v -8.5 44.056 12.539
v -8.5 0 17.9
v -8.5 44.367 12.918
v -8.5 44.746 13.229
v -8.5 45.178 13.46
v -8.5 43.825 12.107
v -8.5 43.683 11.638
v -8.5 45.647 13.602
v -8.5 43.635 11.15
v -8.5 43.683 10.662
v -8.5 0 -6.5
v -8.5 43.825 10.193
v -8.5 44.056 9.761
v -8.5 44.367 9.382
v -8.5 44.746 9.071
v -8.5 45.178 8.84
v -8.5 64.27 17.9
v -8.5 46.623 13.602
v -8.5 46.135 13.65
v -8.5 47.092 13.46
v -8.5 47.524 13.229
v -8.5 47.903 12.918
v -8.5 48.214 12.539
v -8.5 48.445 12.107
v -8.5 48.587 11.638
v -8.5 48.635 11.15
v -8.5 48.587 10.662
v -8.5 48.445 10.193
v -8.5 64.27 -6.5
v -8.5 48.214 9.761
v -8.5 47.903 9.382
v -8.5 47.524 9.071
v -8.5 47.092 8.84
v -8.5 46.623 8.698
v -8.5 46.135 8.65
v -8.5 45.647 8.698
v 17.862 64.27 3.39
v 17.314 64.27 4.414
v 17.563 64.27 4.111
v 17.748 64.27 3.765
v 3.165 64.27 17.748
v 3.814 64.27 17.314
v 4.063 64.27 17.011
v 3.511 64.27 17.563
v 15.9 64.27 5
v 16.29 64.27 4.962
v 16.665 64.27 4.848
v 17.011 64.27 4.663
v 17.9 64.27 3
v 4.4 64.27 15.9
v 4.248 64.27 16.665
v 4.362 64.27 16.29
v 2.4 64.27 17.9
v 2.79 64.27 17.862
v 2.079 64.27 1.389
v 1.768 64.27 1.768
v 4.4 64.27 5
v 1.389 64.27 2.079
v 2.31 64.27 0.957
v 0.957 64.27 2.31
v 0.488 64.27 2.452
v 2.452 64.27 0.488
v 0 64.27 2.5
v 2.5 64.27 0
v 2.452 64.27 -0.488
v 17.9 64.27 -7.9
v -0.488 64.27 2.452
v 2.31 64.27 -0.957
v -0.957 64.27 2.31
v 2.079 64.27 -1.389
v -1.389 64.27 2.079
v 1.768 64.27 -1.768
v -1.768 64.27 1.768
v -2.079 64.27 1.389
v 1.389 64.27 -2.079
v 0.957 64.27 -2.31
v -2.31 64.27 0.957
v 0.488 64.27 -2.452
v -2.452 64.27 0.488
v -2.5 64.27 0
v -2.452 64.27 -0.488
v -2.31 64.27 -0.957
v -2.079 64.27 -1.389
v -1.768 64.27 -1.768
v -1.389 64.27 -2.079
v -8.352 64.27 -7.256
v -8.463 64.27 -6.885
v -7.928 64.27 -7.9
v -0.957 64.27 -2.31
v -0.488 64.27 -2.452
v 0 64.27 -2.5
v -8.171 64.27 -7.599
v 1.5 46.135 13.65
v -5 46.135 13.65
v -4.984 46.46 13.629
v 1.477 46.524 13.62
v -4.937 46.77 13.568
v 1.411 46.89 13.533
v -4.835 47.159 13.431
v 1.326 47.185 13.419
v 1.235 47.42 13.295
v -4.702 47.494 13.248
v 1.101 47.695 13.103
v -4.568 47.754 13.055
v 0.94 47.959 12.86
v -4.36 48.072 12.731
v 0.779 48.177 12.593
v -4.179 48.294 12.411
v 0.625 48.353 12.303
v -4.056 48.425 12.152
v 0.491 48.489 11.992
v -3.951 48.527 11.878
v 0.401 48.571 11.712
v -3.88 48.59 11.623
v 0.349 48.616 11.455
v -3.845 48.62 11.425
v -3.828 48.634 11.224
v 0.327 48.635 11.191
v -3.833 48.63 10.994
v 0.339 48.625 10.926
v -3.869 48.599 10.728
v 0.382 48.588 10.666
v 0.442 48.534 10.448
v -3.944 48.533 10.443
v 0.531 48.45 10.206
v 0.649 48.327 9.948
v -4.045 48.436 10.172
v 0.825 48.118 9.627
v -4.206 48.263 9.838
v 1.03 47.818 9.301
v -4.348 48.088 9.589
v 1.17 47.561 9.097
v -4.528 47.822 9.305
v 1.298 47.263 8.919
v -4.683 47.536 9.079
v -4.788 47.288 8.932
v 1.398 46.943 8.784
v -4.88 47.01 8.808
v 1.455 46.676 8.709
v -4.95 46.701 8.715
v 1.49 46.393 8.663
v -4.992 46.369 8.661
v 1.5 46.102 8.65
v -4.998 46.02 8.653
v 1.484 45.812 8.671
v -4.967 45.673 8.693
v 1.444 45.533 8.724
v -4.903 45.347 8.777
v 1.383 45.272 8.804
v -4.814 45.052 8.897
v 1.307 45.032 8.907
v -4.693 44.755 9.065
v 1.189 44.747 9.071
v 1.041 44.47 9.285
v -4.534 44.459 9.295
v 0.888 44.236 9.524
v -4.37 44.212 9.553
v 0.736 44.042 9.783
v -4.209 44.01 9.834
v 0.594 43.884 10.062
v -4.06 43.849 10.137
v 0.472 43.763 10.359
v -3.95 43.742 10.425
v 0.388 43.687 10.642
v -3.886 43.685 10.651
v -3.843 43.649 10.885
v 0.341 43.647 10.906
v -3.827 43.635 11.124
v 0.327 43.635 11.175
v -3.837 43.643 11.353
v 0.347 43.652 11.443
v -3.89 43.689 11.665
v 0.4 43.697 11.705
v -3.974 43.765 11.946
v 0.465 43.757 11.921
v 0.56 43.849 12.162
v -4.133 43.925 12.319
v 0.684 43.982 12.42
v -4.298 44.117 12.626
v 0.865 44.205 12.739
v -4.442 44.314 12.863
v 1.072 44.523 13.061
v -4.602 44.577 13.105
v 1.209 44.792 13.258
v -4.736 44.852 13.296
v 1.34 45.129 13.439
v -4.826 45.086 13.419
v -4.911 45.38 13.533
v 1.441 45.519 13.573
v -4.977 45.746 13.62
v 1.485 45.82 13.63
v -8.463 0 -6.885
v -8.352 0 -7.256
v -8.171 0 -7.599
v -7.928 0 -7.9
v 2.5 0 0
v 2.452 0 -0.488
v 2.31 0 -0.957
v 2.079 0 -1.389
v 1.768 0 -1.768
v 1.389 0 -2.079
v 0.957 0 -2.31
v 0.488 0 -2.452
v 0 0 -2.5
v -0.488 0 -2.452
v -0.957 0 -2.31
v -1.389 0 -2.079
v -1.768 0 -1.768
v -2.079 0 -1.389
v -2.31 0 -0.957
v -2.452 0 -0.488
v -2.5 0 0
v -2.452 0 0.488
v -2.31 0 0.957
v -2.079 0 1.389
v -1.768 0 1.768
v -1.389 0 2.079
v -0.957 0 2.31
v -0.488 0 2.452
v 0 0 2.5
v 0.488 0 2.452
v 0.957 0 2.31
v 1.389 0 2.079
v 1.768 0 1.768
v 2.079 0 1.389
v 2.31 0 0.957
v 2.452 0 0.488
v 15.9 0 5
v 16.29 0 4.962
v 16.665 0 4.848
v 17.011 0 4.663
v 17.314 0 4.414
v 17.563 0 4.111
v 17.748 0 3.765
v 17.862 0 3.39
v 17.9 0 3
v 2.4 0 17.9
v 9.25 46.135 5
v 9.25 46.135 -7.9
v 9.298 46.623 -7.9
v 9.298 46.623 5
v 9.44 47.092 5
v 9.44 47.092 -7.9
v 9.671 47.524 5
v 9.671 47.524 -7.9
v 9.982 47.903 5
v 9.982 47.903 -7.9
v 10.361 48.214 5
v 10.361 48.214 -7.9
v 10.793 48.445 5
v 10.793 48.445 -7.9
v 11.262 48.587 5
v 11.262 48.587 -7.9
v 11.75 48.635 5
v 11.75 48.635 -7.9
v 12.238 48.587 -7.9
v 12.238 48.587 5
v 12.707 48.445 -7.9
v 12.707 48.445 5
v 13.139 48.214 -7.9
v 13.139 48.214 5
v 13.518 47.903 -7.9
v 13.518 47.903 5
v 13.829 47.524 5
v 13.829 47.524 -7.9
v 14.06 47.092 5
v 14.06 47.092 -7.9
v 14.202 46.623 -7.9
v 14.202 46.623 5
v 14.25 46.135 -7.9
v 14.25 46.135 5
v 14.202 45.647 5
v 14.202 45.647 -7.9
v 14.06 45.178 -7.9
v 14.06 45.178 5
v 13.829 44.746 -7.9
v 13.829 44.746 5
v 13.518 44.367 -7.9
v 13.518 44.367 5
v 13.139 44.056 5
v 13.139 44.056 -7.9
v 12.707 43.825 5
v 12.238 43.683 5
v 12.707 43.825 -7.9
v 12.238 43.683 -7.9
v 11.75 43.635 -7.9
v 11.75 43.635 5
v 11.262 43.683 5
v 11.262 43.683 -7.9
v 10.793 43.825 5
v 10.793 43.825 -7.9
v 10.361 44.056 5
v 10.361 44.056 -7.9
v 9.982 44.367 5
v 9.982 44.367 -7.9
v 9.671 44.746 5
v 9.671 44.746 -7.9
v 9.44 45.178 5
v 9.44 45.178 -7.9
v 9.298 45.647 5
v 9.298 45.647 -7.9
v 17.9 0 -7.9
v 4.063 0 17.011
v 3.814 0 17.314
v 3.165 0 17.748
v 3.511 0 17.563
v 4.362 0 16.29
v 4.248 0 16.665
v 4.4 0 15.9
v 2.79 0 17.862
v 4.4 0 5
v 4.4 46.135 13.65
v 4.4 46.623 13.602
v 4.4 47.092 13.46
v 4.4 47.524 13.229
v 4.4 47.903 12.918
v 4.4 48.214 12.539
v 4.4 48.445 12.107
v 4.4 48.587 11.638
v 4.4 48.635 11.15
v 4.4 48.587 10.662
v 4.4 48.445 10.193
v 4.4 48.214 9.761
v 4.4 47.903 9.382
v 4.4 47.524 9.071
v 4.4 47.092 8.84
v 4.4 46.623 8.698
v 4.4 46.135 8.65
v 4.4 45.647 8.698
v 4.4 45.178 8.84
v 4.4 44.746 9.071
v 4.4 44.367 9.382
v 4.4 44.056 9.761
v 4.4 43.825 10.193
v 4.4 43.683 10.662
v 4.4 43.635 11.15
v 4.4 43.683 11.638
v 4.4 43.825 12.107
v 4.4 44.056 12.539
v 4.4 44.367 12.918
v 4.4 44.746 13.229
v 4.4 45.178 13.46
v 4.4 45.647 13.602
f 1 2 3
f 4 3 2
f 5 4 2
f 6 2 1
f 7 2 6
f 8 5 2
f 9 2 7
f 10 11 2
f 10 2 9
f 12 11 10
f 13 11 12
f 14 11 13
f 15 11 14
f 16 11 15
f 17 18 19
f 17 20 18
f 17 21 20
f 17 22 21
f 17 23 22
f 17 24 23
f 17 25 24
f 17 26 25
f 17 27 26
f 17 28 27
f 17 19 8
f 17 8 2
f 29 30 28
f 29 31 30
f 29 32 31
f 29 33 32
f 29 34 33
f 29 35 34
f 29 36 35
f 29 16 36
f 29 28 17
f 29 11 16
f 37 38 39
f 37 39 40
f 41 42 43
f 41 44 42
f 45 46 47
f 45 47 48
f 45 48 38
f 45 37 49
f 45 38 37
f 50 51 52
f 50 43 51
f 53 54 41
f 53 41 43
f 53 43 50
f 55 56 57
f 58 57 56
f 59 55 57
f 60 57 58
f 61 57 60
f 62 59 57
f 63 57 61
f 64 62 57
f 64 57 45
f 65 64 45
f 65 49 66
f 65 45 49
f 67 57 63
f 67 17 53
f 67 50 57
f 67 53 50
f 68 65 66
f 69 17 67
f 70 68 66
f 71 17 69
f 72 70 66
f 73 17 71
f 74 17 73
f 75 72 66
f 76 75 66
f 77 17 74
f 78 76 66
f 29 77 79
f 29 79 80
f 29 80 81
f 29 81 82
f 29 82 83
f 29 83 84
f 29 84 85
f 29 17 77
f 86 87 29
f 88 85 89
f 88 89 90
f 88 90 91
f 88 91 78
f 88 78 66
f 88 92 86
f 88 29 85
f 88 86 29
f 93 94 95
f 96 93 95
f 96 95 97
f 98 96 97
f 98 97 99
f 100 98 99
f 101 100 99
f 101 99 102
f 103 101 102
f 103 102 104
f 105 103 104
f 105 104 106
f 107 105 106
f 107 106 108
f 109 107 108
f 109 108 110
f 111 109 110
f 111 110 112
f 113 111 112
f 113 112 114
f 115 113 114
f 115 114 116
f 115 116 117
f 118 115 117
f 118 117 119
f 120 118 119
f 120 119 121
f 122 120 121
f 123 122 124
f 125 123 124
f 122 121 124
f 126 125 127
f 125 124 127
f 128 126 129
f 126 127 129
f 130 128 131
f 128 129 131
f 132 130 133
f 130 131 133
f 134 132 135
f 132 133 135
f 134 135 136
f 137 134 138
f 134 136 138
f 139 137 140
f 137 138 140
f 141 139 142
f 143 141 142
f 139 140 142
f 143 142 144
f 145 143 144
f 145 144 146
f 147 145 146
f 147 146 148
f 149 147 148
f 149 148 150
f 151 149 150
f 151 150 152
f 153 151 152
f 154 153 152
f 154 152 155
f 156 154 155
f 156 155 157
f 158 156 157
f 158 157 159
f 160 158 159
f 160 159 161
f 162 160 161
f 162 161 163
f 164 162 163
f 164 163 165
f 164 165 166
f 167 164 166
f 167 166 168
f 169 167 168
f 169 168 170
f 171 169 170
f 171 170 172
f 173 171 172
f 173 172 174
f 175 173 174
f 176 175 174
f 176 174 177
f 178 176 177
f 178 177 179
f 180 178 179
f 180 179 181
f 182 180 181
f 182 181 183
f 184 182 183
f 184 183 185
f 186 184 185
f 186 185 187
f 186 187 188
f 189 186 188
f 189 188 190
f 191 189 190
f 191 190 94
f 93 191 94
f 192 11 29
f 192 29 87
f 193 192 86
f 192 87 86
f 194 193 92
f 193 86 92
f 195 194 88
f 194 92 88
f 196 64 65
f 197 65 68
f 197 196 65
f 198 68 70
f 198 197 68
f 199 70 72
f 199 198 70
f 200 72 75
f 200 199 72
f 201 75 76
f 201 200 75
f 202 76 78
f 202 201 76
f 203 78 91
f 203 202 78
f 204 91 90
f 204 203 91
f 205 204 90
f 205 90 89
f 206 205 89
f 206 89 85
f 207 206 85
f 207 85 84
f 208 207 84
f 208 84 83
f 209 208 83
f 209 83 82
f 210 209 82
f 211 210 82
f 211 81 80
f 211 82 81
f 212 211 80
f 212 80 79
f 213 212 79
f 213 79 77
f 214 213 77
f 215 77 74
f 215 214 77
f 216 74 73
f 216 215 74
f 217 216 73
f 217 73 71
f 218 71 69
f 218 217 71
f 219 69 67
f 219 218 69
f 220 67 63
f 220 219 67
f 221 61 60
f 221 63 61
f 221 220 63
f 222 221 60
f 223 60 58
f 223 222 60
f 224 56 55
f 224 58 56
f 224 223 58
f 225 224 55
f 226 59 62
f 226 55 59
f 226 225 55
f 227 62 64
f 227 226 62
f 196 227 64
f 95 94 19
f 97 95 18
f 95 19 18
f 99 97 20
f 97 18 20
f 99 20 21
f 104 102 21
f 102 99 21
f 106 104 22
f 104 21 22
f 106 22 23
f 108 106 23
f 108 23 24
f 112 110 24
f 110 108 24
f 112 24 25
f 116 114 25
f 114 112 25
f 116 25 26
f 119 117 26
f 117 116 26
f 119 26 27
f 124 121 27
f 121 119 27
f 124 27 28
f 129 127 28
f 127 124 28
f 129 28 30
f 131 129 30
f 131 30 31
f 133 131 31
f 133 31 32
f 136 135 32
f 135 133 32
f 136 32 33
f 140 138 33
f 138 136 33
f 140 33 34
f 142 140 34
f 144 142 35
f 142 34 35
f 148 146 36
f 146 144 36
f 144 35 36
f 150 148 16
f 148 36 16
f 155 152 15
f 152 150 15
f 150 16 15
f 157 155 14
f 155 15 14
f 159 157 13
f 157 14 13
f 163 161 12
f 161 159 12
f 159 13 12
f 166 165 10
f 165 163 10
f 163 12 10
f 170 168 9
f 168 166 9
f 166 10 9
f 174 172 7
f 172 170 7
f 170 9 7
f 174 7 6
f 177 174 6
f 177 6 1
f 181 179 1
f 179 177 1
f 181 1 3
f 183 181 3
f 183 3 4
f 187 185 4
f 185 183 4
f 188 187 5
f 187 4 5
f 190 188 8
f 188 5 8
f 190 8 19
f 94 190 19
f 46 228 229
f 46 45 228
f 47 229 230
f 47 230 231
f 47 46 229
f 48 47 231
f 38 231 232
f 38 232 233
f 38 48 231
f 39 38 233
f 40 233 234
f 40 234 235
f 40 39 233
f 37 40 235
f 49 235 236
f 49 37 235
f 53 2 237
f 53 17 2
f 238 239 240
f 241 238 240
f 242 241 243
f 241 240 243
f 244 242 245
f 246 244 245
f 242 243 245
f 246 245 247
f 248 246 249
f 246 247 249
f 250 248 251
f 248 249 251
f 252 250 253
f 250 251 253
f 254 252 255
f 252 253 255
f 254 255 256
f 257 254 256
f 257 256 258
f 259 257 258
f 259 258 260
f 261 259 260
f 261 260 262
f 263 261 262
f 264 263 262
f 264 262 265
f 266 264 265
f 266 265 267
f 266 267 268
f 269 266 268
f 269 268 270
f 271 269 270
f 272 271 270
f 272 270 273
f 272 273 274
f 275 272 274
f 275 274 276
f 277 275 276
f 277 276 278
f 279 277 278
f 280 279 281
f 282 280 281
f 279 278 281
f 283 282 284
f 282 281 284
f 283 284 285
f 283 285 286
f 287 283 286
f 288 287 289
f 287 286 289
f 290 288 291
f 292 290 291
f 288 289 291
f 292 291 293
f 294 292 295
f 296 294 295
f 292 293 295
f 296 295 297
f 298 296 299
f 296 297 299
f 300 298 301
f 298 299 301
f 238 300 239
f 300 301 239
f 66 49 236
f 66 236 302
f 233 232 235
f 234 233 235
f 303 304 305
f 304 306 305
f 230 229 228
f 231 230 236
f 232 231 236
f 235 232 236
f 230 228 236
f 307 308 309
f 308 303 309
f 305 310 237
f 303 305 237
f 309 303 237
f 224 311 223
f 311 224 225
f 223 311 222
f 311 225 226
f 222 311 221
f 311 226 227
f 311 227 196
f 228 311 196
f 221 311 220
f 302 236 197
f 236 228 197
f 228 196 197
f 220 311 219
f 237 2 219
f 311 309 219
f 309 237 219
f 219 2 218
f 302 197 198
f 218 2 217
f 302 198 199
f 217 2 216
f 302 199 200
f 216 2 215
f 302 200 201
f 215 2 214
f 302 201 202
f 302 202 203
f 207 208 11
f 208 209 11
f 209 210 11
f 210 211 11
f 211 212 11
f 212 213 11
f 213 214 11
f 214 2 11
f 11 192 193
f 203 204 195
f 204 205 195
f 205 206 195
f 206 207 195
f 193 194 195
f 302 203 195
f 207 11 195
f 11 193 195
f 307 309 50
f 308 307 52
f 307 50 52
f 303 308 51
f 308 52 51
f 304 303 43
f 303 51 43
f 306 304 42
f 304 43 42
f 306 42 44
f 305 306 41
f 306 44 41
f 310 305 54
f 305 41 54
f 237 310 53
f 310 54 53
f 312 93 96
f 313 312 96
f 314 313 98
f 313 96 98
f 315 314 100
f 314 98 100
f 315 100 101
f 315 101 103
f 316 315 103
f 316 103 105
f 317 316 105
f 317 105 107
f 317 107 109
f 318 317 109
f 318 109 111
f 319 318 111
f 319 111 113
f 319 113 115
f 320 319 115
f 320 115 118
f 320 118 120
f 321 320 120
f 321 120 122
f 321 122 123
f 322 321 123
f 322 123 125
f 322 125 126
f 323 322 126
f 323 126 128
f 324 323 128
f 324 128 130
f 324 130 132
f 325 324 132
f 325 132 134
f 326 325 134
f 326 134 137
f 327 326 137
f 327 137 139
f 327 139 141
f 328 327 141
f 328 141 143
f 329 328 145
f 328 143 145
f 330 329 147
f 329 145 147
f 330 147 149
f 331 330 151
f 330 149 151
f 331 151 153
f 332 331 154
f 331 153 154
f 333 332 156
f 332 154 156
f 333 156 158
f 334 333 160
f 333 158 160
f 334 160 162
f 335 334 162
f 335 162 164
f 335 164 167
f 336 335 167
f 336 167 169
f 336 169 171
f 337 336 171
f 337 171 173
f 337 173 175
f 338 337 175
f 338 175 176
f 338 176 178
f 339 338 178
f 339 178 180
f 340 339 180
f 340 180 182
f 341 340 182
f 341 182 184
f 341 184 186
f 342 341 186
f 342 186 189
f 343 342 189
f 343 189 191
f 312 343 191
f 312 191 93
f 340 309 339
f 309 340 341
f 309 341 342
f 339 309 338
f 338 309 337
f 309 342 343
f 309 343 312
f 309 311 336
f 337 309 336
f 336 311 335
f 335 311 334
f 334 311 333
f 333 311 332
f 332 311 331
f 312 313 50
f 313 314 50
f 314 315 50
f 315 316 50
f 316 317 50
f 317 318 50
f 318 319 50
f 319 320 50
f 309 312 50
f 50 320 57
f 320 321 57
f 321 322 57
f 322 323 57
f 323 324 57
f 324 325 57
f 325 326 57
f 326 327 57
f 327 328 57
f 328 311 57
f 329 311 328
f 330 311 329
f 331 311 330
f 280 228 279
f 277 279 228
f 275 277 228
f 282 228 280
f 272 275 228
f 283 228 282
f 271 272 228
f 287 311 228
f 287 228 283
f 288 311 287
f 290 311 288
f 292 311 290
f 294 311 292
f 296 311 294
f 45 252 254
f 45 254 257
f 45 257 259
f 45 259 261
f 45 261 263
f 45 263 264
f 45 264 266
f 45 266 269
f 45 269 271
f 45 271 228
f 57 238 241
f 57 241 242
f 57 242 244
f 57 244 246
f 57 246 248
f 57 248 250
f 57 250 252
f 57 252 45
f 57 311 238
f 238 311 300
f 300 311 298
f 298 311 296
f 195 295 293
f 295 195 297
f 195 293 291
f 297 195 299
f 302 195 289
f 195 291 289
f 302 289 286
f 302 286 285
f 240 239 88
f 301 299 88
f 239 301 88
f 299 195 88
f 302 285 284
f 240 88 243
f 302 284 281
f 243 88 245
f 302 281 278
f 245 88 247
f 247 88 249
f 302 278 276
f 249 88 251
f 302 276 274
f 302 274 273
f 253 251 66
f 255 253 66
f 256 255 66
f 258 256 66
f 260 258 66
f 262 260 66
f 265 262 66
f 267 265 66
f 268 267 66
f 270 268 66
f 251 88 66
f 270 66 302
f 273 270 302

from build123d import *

# Parameters (mm, degrees)
HOLE_TOPMAIN_OUTLINE_W = 12.9
HOLE_TOPMAIN_OUTLINE_H = 12.9
HOLE_TOPMAIN_OUTLINE_R = 2.5
HOLE_TOPMAIN_DEPTH     = 64.27
SKETCH14_R             = 2.5
CUT_EXTRUDE9_DEPTH     = 67.100627077
SKETCH15_R             = 3.25
CUT_EXTRUDE10_DEPTH    = 66.309210028
SKETCH18_W             = 12.9
SKETCH18_H             = 64.27
SKETCH18_R             = 3.25
BOSS_EXTRUDE2_DEPTH    = 13.5
FILLET3_R              = 2
SKETCH19_R             = 2.5
CUT_EXTRUDE11_DEPTH    = 13.5
SKETCH22_W             = 13.5
SKETCH22_H             = 64.27
BOSS_EXTRUDE3_DEPTH    = 13.5
BOSS_EXTRUDE5_START    = -26.4
SKETCH24_R             = 3.25
BOSS_EXTRUDE5_DEPTH    = 26.4
CUT_EXTRUDE12_START    = -64.27
SKETCH25_R             = 2.5
CUT_EXTRUDE12_DEPTH    = 64.27
SKETCH26_R             = 2.5
CUT_EXTRUDE13_DEPTH    = 13.5
SKETCH28_R             = 2.5
CUT_EXTRUDE14_DEPTH    = 13.5
FILLET4_R              = 2
SKETCH31_W             = 26.4
SKETCH31_H             = 0.6
CUT_EXTRUDE15_DEPTH    = 64.27


# Read off the part's stored shape, not the designer's step: hole-TopMain
with BuildPart() as part:
    # hole-TopMain outline → hole-TopMain (new body)
    with BuildSketch(Plane(origin=(0, 0, 0), x_dir=(1, 0, 0), z_dir=(0, 1, 0))):
        with Locations((-2.05, 2.05)):
            Rectangle(HOLE_TOPMAIN_OUTLINE_W, HOLE_TOPMAIN_OUTLINE_H)
        Circle(HOLE_TOPMAIN_OUTLINE_R, mode=Mode.SUBTRACT)
    extrude(amount=HOLE_TOPMAIN_DEPTH)

    # Sketch14 → Cut-Extrude9 (cut, through all)
    with BuildSketch(Plane(origin=(0, 0, -8.5), x_dir=(-1, 0, 0), z_dir=(0, 0, -1))):
        with Locations((1.75, 46.135)):
            Circle(SKETCH14_R)
    extrude(amount=-CUT_EXTRUDE9_DEPTH, mode=Mode.SUBTRACT)

    # Sketch15 → Cut-Extrude10 (cut, through all)
    with BuildSketch(Plane(origin=(0, 0, -3.5), x_dir=(-1, 0, 0), z_dir=(0, 0, -1))):
        with Locations((1.75, 46.135)):
            Circle(SKETCH15_R)
    extrude(amount=-CUT_EXTRUDE10_DEPTH, mode=Mode.SUBTRACT)

    # Sketch18 → Boss-Extrude2 (add)
    with BuildSketch(Plane.XY.offset(4.4)):
        with Locations((-2.05, 32.135)):
            Rectangle(SKETCH18_W, SKETCH18_H)
        with Locations(Location((-1.75, 46.135, 0), (0, 0, 180))):
            Circle(SKETCH18_R, mode=Mode.SUBTRACT)
    extrude(amount=BOSS_EXTRUDE2_DEPTH)

    # Fillet3
    fillet3_edges = [part.edges().sort_by_distance(p)[0] for p in [
        (-8.5, 32.135, -8.5),
        (4.4, 32.135, 17.9),
    ]]
    fillet(fillet3_edges, radius=FILLET3_R)

    # Sketch19 → Cut-Extrude11 (cut)
    with BuildSketch(Plane.ZY.offset(8.5)):
        with Locations((11.15, 46.135)):
            Circle(SKETCH19_R)
    extrude(amount=-CUT_EXTRUDE11_DEPTH, mode=Mode.SUBTRACT)

    # Sketch22 → Boss-Extrude3 (add)
    with BuildSketch(Plane(origin=(4.4, 0, 0), x_dir=(0, 0, -1), z_dir=(1, 0, 0))):
        with Locations((1.75, 32.135)):
            Rectangle(SKETCH22_W, SKETCH22_H)
    extrude(amount=BOSS_EXTRUDE3_DEPTH)

    # Sketch24 → Boss-Extrude5 (add)
    with BuildSketch(Plane.XY.offset(17.9).offset(BOSS_EXTRUDE5_START)):
        with Locations((-1.75, 46.135)):
            Circle(SKETCH24_R)
    extrude(amount=BOSS_EXTRUDE5_DEPTH)

    # Sketch25 → Cut-Extrude12 (cut)
    with BuildSketch(Plane(origin=(0, 64.27, 0), x_dir=(1, 0, 0), z_dir=(0, 1, 0)).offset(CUT_EXTRUDE12_START)):
        with Locations(Location((0, 0, 0), (0, 0, 90))):
            Circle(SKETCH25_R)
    extrude(amount=CUT_EXTRUDE12_DEPTH, mode=Mode.SUBTRACT)

    # Sketch26 → Cut-Extrude13 (cut)
    with BuildSketch(Plane.ZY.offset(8.5)):
        with Locations((11.15, 46.135)):
            Circle(SKETCH26_R)
    extrude(amount=-CUT_EXTRUDE13_DEPTH, mode=Mode.SUBTRACT)

    # Sketch28 → Cut-Extrude14 (cut)
    with BuildSketch(Plane(origin=(0, 0, -8.5), x_dir=(-1, 0, 0), z_dir=(0, 0, -1))):
        with Locations((-11.75, 46.135)):
            Circle(SKETCH28_R)
    extrude(amount=-CUT_EXTRUDE14_DEPTH, mode=Mode.SUBTRACT)

    # Fillet4
    fillet4_edges = [part.edges().sort_by_distance(p)[0] for p in [
        (17.9, 32.135, 5),
    ]]
    fillet(fillet4_edges, radius=FILLET4_R)

    # Sketch31 → Cut-Extrude15 (cut)
    with BuildSketch(Plane(origin=(0, 64.27, 0), x_dir=(1, 0, 0), z_dir=(0, 1, 0))):
        with Locations((4.7, 8.2)):
            Rectangle(SKETCH31_W, SKETCH31_H)
    extrude(amount=-CUT_EXTRUDE15_DEPTH, mode=Mode.SUBTRACT)


solid = part.part
